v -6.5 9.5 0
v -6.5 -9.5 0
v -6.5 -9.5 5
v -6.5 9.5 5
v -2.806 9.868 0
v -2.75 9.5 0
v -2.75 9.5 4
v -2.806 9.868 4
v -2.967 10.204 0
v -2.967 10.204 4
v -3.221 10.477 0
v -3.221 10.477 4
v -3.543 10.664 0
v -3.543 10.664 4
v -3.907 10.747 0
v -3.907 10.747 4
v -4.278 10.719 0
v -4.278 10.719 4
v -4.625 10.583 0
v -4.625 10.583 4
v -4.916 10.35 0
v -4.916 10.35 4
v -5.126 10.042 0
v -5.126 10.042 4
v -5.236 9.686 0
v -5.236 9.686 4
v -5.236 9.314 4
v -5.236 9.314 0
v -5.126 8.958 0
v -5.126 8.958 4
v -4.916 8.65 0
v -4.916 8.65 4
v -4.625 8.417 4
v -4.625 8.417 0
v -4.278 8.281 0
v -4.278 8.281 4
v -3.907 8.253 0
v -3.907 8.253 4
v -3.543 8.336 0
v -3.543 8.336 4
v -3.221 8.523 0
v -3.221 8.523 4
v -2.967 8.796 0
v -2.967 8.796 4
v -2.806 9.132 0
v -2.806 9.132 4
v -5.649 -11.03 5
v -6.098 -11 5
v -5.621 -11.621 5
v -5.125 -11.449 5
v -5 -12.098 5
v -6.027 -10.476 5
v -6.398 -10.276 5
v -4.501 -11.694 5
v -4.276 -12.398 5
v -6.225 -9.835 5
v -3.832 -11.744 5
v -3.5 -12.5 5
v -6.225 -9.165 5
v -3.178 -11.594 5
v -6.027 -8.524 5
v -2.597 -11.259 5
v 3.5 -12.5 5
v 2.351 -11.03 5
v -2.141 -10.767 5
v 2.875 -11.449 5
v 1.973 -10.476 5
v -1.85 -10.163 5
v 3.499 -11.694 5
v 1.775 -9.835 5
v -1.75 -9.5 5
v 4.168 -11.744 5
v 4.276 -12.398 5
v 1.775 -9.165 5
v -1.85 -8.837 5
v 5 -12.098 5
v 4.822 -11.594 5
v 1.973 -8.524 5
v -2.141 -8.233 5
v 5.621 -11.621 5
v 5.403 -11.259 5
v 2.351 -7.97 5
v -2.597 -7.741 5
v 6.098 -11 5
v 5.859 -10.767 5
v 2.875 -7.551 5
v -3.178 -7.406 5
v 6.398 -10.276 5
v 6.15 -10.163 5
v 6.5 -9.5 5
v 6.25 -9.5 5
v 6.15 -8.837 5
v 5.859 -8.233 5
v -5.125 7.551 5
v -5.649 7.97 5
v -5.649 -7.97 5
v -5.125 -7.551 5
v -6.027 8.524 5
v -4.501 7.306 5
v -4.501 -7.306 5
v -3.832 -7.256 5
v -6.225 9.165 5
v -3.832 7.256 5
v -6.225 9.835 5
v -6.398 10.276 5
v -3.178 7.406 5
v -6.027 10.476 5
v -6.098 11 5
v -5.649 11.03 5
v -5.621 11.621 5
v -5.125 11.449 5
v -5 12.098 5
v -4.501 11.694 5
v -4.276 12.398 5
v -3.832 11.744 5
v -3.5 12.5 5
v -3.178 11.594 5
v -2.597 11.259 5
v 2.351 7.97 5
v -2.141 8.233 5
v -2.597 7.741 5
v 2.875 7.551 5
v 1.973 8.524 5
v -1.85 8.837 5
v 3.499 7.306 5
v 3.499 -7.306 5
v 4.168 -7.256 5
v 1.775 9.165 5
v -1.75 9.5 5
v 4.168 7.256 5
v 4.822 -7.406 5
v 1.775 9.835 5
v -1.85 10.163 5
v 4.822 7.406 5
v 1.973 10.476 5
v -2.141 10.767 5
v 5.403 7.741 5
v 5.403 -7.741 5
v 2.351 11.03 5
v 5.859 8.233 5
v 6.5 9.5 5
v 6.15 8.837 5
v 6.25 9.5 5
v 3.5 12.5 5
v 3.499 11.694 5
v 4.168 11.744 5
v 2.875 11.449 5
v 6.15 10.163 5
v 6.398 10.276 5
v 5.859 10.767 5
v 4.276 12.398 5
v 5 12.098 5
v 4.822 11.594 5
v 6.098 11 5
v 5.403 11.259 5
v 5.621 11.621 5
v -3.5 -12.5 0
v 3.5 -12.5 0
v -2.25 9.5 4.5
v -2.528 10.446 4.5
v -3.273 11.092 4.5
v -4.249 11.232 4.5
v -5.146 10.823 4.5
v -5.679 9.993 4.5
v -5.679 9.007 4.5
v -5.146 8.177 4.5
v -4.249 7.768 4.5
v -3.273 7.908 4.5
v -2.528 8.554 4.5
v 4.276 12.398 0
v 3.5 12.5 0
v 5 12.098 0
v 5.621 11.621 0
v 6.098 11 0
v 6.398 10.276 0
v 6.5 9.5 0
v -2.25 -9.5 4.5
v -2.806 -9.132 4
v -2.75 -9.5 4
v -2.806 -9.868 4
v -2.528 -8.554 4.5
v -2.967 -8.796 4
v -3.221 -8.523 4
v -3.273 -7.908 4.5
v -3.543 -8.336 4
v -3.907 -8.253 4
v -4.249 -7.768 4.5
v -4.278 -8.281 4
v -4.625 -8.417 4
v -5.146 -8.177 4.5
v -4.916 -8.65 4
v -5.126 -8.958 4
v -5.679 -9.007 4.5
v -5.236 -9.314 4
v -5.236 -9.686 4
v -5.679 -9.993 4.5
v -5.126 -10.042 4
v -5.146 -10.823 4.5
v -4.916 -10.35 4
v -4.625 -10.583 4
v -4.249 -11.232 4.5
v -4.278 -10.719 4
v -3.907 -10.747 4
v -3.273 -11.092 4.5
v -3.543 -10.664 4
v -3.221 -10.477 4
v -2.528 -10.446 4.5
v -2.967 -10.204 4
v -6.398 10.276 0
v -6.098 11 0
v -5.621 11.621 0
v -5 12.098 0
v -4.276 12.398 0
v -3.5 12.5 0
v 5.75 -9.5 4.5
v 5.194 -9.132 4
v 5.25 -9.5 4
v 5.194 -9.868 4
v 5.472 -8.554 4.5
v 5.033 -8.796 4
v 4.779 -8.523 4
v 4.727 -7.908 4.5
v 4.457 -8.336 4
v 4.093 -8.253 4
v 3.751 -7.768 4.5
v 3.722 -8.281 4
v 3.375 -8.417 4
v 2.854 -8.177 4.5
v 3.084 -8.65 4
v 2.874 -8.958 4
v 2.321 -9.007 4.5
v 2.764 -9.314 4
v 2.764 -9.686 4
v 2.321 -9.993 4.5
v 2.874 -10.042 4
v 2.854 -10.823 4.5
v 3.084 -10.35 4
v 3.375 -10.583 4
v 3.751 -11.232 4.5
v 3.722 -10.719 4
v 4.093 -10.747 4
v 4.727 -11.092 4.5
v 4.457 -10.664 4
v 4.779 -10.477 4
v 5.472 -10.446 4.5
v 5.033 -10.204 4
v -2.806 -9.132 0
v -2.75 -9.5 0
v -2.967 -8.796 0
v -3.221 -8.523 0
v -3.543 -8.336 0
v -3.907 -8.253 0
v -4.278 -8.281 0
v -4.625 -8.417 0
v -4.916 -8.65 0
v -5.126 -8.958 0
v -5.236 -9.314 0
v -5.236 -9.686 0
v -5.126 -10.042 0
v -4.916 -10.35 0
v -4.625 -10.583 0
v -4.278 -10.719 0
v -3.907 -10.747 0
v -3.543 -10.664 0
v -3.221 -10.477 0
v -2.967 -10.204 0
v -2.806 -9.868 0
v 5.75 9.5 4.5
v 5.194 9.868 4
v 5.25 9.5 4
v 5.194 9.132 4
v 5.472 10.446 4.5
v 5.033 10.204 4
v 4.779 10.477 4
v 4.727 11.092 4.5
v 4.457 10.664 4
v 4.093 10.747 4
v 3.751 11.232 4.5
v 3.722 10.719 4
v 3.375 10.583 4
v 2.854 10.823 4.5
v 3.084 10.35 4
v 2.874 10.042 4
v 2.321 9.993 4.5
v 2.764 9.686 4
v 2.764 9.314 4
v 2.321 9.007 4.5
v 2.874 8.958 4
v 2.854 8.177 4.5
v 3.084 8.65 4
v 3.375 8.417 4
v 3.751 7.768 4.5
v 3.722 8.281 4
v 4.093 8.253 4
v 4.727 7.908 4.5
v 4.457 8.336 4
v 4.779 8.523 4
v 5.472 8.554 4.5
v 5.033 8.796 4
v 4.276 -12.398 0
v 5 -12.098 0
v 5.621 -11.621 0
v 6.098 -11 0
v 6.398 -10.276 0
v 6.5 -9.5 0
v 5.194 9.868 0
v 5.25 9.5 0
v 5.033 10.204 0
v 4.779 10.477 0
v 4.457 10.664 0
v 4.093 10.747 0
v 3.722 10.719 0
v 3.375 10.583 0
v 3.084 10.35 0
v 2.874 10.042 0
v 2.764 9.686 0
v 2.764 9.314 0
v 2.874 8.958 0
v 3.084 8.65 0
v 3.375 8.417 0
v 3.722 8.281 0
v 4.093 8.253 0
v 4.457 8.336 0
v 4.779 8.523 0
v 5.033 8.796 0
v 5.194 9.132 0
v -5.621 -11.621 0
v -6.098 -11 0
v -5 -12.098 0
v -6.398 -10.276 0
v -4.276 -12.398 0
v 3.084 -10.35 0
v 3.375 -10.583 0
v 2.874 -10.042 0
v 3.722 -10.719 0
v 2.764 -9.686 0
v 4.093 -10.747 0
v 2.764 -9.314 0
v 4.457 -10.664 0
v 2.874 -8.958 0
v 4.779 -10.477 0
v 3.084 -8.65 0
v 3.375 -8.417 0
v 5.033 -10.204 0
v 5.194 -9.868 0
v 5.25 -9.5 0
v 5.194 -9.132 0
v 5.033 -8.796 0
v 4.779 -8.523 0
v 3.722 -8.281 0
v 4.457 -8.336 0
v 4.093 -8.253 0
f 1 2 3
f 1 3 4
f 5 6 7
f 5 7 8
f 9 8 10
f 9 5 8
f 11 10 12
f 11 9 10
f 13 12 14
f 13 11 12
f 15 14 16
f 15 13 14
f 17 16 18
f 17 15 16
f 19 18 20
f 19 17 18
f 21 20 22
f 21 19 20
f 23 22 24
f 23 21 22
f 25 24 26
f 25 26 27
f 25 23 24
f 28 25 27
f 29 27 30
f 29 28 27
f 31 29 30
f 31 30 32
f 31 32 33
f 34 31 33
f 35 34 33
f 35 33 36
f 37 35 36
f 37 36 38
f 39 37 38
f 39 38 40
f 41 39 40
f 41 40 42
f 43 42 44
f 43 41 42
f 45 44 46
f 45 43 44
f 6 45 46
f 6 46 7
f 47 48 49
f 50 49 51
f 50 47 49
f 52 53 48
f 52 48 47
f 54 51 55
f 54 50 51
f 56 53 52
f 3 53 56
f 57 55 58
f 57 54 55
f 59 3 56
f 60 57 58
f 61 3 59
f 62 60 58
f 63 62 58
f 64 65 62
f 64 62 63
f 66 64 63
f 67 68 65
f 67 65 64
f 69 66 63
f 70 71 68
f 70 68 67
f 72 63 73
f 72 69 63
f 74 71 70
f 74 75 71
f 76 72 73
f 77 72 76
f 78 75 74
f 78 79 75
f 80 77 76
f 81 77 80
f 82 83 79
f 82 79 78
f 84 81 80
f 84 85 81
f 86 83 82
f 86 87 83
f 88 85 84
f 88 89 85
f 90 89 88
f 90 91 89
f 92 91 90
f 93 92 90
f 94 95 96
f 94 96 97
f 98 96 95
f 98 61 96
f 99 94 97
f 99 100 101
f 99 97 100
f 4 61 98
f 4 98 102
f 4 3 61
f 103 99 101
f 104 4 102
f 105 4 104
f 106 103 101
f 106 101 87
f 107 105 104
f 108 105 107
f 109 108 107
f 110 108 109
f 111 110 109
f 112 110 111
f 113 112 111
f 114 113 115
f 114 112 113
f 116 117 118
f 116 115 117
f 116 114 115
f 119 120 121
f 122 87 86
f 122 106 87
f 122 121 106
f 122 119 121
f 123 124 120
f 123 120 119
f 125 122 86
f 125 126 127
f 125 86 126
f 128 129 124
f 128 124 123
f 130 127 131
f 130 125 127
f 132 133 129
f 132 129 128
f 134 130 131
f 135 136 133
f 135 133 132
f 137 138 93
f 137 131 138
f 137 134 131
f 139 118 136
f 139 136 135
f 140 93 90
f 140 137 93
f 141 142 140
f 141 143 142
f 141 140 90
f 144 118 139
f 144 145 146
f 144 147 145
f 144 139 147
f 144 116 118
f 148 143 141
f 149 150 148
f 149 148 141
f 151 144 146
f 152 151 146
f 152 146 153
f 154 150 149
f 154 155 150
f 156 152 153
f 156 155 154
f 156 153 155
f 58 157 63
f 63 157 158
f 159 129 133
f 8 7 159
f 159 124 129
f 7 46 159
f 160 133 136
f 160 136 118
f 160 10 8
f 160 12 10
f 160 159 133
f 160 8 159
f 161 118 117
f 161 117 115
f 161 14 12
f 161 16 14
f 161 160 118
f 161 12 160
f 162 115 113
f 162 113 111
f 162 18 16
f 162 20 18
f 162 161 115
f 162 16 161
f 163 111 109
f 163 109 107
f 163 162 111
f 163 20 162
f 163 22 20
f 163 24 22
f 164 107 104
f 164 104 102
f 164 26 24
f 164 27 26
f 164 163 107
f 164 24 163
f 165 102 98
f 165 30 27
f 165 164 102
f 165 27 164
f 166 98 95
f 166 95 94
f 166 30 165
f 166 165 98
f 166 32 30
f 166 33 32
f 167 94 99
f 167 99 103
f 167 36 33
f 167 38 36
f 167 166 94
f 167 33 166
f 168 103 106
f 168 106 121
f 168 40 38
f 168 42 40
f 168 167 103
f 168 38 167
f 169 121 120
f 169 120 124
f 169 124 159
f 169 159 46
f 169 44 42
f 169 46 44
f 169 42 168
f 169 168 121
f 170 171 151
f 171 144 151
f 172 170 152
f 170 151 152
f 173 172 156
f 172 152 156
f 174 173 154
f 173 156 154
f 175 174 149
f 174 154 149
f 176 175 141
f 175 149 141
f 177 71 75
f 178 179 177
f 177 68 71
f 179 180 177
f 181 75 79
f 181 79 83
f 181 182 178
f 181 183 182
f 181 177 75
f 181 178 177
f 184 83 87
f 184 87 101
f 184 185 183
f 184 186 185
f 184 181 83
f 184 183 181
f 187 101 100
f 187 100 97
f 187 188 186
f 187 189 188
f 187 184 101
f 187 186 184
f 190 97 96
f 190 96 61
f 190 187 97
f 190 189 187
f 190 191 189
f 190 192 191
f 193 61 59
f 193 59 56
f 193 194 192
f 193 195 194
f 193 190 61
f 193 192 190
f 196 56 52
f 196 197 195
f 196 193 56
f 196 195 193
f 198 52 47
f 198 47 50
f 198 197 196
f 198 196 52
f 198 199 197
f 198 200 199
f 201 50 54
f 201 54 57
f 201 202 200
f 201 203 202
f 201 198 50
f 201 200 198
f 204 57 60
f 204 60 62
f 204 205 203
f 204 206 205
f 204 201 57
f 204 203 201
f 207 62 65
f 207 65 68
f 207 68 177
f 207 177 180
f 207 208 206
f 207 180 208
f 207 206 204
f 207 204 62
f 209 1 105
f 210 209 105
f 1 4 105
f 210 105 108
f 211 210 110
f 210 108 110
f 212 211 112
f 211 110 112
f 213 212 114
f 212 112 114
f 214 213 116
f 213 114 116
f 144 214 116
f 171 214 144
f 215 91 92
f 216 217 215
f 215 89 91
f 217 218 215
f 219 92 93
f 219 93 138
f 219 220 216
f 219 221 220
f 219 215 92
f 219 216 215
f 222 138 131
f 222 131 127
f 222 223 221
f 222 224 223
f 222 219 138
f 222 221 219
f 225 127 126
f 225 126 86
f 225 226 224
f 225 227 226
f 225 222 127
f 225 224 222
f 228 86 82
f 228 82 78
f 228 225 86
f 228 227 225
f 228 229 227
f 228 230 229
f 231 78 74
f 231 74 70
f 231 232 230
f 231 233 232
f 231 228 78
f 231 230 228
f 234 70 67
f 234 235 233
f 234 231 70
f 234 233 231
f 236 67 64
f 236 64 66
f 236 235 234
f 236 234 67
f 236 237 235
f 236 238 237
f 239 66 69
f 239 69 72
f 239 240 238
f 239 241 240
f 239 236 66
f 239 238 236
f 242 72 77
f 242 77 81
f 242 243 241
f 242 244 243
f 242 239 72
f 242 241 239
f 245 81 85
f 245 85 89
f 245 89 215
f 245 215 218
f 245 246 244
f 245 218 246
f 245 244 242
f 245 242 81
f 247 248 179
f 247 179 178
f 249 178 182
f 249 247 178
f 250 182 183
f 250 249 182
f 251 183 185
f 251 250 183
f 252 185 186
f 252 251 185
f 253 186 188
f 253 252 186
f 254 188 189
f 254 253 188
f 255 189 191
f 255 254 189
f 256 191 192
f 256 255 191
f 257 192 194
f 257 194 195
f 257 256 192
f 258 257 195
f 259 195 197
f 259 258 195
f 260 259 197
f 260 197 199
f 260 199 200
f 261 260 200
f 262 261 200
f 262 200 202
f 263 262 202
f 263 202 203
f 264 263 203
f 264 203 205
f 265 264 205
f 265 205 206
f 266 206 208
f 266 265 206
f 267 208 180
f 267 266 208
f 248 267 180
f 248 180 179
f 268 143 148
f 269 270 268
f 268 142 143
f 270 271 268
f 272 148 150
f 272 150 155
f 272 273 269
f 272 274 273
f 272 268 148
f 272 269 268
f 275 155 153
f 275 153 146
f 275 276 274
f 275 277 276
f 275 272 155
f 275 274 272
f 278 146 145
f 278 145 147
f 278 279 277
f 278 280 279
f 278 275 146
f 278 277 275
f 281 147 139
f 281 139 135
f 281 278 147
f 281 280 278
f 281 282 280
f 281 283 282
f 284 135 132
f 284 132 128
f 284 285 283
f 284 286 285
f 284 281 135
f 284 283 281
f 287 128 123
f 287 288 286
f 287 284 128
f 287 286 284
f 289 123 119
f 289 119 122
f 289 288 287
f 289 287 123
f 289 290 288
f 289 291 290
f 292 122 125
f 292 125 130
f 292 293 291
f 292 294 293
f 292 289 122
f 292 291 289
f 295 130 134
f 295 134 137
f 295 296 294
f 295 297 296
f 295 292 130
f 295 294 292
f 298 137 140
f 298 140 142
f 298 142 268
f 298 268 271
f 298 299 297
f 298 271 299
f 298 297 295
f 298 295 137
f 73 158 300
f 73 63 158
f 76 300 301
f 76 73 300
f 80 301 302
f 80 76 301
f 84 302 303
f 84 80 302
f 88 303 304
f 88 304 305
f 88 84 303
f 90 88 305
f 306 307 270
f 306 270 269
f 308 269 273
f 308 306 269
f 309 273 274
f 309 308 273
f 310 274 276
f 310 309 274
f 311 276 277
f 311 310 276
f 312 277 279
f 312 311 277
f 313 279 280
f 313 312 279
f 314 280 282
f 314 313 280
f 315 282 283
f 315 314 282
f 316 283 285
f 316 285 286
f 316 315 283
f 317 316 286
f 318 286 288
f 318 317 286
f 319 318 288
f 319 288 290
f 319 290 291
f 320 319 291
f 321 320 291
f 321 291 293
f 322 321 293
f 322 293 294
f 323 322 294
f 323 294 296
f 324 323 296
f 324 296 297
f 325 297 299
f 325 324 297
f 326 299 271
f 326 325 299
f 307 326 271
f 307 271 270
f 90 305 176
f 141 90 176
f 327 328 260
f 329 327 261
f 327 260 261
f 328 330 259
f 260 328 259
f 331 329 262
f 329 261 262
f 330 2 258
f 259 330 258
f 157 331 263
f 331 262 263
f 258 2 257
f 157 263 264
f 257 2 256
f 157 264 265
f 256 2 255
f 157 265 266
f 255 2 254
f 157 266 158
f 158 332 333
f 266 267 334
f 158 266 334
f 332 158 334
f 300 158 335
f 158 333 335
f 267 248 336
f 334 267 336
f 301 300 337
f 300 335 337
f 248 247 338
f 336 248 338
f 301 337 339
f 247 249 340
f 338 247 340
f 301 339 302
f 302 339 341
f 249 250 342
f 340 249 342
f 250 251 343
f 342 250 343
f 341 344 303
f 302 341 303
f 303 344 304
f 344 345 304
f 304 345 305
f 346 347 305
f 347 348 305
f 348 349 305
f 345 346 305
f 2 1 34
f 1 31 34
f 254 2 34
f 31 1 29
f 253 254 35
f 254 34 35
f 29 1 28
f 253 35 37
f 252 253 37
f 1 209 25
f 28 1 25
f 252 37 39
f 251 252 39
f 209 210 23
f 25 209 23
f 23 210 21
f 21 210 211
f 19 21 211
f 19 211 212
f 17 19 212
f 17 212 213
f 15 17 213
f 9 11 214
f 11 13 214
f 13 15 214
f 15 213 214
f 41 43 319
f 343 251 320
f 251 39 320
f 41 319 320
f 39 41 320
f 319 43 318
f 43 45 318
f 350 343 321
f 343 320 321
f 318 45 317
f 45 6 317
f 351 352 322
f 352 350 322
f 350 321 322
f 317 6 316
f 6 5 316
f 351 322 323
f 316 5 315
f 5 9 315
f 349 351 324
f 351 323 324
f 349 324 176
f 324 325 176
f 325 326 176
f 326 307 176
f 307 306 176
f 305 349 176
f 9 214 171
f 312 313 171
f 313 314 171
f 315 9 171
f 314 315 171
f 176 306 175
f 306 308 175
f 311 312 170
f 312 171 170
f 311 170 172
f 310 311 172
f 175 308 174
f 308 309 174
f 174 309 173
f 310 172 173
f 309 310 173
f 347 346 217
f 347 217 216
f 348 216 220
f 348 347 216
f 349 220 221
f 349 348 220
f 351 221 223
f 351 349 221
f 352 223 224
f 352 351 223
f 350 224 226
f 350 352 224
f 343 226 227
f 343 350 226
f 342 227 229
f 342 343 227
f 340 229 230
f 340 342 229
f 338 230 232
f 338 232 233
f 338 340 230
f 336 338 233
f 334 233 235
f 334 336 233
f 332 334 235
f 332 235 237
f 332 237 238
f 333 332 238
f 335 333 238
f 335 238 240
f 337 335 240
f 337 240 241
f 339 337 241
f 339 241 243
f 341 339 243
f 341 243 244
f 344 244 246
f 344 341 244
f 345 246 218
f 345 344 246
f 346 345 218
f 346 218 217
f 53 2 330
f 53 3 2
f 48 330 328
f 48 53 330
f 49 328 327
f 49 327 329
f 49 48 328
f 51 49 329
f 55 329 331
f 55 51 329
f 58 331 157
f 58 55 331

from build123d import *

# Parameters (mm, degrees)
F0_W     = 13
F0_H     = 25
F0_R     = 1.25
F1_DEPTH = 5
F2_R     = 3
F3_SIZE  = 1


with BuildPart() as f1:
    # F0 (on Top) → F1 (new body)
    with BuildSketch(Plane.XY):
        Rectangle(F0_W, F0_H)
        with Locations((-4, -9.5)):
            Circle(F0_R, mode=Mode.SUBTRACT)
        with Locations((4, -9.5)):
            Circle(F0_R, mode=Mode.SUBTRACT)
        with Locations((-4, 9.5)):
            Circle(F0_R, mode=Mode.SUBTRACT)
        with Locations((4, 9.5)):
            Circle(F0_R, mode=Mode.SUBTRACT)
    extrude(amount=F1_DEPTH)

    # F2
    f2_edges = [f1.edges().sort_by_distance(p)[0] for p in [
        (-6.5, -12.5, 2.5),
        (6.5, -12.5, 2.5),
        (6.5, 12.5, 2.5),
        (-6.5, 12.5, 2.5),
    ]]
    fillet(f2_edges, radius=F2_R)

    # F3
    f3_edges = [f1.edges().sort_by_distance(p)[0] for p in [
        (-5.25, 9.5, 5),
        (2.75, 9.5, 5),
        (2.75, -9.5, 5),
        (-5.25, -9.5, 5),
    ]]
    chamfer(f3_edges, length=F3_SIZE)


solid = f1.part
